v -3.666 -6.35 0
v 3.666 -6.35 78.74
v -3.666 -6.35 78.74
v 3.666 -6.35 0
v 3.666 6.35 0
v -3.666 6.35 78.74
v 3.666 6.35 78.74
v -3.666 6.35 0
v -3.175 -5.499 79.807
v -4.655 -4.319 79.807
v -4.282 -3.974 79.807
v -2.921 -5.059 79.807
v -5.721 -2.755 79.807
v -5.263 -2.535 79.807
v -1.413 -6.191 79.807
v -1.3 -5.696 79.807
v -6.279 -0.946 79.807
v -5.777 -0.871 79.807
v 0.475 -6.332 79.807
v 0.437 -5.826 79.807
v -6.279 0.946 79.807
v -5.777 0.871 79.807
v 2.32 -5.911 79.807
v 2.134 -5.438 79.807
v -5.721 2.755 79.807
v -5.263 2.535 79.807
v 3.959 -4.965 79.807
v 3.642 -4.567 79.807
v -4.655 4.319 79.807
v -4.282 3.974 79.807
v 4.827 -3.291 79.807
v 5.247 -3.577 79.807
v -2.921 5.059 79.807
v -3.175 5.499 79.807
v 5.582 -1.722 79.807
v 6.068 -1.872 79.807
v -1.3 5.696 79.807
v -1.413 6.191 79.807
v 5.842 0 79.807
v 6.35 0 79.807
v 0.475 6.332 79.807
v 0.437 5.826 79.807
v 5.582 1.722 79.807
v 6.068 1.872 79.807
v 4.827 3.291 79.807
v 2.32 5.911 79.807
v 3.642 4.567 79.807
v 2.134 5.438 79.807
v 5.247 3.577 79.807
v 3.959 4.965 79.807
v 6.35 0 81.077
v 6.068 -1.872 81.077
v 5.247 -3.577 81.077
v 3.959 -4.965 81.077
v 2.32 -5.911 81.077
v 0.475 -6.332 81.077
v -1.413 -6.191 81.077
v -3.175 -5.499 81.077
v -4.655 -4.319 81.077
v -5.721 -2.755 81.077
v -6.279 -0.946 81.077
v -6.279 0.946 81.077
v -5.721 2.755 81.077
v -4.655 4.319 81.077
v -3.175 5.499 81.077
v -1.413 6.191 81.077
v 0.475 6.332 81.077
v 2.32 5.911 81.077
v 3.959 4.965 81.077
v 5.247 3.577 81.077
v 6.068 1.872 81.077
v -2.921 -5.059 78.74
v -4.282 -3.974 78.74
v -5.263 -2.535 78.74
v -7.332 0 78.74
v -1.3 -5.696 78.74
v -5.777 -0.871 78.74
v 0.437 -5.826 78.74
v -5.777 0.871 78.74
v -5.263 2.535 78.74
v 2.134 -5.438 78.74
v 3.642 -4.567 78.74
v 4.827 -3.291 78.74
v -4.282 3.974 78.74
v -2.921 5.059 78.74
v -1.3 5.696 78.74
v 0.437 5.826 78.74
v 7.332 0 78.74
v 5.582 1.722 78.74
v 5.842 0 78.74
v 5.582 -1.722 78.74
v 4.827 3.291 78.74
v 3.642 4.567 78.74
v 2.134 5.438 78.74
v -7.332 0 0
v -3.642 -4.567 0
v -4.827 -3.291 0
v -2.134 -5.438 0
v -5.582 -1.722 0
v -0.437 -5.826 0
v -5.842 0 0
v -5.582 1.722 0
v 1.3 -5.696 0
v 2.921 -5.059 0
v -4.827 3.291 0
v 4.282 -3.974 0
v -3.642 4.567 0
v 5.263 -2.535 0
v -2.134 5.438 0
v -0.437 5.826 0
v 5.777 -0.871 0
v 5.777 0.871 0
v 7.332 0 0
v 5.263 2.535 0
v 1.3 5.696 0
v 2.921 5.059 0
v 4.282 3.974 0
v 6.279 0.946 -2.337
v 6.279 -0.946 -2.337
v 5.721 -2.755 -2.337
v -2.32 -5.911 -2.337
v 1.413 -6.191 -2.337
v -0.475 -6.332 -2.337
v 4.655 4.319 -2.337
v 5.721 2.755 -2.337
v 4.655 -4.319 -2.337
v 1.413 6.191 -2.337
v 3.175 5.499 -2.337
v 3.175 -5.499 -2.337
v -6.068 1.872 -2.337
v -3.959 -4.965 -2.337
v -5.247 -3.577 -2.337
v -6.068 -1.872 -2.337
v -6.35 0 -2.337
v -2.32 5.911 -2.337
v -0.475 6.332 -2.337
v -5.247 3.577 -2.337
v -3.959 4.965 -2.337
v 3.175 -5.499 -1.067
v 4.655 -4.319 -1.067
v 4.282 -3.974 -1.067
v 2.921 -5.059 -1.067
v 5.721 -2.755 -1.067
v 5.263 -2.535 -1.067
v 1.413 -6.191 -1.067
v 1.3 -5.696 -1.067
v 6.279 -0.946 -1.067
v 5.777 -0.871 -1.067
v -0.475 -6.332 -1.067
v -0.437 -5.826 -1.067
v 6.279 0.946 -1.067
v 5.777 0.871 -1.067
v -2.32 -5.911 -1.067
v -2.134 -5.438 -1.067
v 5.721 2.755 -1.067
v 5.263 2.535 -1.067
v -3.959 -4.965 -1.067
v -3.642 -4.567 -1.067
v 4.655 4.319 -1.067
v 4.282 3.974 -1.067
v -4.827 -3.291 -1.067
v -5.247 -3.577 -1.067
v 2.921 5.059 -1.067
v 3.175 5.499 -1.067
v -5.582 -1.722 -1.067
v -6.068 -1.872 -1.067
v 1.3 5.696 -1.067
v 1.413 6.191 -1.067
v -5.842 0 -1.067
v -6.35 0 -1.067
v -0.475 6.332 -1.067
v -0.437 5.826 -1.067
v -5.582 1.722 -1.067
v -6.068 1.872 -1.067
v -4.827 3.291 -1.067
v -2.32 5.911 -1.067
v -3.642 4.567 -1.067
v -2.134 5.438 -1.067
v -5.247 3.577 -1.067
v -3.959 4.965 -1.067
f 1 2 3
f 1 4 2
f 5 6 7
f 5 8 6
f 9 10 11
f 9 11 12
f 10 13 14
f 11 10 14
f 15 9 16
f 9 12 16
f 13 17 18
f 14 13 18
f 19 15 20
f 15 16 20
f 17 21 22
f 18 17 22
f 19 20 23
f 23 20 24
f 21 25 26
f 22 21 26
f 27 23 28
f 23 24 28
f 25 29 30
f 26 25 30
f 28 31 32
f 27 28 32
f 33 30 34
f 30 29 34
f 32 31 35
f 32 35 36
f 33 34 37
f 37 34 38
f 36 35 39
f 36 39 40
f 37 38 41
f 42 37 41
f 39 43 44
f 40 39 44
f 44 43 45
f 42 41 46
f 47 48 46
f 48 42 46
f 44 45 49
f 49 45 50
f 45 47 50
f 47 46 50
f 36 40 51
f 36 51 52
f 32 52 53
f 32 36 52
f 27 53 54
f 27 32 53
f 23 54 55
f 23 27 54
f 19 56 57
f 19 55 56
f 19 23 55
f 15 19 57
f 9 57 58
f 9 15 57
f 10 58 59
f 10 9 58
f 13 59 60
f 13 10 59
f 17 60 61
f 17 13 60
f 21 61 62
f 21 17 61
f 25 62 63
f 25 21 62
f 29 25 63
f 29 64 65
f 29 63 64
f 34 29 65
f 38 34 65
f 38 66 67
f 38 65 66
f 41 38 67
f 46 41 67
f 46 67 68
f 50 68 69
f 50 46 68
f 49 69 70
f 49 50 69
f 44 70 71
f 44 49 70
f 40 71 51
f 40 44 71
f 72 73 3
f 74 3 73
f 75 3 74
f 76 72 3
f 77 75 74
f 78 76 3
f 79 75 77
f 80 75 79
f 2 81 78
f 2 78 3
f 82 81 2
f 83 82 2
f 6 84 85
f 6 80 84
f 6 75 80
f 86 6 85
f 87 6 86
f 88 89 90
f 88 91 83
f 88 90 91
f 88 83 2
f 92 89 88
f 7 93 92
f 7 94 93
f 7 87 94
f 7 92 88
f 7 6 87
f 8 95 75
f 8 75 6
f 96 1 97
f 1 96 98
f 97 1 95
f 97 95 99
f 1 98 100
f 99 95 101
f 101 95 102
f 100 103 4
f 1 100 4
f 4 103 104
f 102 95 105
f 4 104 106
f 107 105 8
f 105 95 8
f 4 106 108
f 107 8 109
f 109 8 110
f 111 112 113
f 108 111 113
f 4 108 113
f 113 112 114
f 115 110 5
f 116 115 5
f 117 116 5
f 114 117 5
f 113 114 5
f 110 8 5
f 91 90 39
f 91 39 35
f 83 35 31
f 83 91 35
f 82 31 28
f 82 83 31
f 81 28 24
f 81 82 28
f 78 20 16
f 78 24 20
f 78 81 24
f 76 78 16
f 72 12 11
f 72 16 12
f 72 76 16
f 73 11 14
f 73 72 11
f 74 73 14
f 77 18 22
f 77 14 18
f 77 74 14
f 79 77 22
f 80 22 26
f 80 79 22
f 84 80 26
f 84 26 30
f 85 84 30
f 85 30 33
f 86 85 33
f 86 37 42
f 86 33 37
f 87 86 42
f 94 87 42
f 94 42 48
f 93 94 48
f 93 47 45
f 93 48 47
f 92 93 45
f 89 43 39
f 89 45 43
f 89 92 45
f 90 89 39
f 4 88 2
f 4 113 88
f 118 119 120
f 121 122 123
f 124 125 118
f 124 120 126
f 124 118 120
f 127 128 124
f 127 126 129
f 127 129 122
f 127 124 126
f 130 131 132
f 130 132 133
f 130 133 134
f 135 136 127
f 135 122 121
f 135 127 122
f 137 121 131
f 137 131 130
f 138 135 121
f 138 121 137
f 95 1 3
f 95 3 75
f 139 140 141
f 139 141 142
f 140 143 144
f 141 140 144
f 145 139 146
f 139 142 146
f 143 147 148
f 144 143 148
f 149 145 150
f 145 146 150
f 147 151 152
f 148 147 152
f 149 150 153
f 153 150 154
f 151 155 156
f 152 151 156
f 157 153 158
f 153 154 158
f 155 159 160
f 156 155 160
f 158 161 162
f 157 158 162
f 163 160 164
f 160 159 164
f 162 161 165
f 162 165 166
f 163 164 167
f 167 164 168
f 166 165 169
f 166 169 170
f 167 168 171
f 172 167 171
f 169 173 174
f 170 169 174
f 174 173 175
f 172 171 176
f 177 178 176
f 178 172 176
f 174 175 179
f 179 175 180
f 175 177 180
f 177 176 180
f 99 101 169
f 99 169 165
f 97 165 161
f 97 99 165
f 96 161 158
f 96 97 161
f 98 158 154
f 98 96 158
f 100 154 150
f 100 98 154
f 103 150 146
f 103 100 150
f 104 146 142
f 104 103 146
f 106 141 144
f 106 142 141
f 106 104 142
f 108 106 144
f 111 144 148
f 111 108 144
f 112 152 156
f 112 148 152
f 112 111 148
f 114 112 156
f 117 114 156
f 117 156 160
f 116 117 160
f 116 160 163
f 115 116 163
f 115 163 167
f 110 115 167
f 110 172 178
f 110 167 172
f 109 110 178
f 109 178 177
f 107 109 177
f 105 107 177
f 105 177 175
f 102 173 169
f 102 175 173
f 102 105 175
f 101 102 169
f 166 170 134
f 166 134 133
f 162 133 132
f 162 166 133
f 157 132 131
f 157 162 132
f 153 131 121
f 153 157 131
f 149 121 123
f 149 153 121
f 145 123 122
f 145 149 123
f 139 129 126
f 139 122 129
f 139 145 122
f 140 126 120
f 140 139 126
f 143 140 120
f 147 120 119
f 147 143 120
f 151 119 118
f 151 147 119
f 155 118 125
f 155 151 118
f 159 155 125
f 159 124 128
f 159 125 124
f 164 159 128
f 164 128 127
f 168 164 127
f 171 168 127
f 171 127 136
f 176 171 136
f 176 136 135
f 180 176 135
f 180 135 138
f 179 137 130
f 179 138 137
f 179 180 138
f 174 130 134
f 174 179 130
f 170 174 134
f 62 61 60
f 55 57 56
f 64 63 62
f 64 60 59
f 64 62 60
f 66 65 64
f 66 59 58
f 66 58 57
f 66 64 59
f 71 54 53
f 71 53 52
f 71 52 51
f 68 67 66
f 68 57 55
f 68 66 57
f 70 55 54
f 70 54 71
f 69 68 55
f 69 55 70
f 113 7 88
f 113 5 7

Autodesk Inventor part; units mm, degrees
ref_plane "YZ Plane" through (0, 0, 0) normal (1, 0, 0) x (0, 1, 0)
ref_plane "XZ Plane" through (0, 0, 0) normal (0, 1, 0) x (-1, 0, 0)
ref_plane "XY Plane" through (0, 0, 0) normal (0, 0, 1) x (1, 0, 0)
sketch "Sketch1" plane through (0, 0, 0) normal (0, 0, 1) x (1, 0, 0)
  line L0 (7.3323, 0) -> (3.6662, -6.35)
  line L1 (3.6662, -6.35) -> (-3.6662, -6.35)
  line L2 (-3.6662, -6.35) -> (-7.3323, 0)
  line L3 (-7.3323, 0) -> (-3.6662, 6.35)
  line L4 (-3.6662, 6.35) -> (3.6662, 6.35)
  line L5 (3.6662, 6.35) -> (7.3323, 0)
  point P0 (0, 0)
  point P1 (0, 0)
  dimension "d0" = 12.7
extrude "Extrusion1" add sketch "Sketch1" along normal blind 78.74
sketch "Sketch2" plane through (0, 0, 78.74) normal (0, 0, 1) x (1, 0, 0)
  circle A0 centre (0, 0) radius 5.842
  dimension "d7" = 11.684
extrude "Extrusion2" add sketch "Sketch2" along normal blind 1.0668
sketch "Sketch3" plane through (0, 0, 79.8068) normal (0, 0, 1) x (1, 0, 0)
  circle A0 centre (0, 0) radius 6.35
extrude "Extrusion3" add sketch "Sketch3" along normal blind 1.27
sketch "Sketch4" plane through (0, 0, 0) normal (0, 0, -1) x (-1, 0, 0)
  circle A0 centre (0, 0) radius 5.842
  circle A1 centre (0, 0) radius 6.35 projected
  dimension "d8" = 11.684
extrude "Extrusion4" add sketch "Sketch4" along normal blind 1.0668 contours A0
sketch "Sketch5" plane through (0, 0, -1.0668) normal (0, 0, -1) x (-1, 0, 0)
  circle A0 centre (0, 0) radius 6.35
  dimension "d11" = 12.7
extrude "Extrusion5" add sketch "Sketch5" along normal blind 1.27
properties part number "CPS_007_HexShaftForCPS" material "Aluminum 6061"
